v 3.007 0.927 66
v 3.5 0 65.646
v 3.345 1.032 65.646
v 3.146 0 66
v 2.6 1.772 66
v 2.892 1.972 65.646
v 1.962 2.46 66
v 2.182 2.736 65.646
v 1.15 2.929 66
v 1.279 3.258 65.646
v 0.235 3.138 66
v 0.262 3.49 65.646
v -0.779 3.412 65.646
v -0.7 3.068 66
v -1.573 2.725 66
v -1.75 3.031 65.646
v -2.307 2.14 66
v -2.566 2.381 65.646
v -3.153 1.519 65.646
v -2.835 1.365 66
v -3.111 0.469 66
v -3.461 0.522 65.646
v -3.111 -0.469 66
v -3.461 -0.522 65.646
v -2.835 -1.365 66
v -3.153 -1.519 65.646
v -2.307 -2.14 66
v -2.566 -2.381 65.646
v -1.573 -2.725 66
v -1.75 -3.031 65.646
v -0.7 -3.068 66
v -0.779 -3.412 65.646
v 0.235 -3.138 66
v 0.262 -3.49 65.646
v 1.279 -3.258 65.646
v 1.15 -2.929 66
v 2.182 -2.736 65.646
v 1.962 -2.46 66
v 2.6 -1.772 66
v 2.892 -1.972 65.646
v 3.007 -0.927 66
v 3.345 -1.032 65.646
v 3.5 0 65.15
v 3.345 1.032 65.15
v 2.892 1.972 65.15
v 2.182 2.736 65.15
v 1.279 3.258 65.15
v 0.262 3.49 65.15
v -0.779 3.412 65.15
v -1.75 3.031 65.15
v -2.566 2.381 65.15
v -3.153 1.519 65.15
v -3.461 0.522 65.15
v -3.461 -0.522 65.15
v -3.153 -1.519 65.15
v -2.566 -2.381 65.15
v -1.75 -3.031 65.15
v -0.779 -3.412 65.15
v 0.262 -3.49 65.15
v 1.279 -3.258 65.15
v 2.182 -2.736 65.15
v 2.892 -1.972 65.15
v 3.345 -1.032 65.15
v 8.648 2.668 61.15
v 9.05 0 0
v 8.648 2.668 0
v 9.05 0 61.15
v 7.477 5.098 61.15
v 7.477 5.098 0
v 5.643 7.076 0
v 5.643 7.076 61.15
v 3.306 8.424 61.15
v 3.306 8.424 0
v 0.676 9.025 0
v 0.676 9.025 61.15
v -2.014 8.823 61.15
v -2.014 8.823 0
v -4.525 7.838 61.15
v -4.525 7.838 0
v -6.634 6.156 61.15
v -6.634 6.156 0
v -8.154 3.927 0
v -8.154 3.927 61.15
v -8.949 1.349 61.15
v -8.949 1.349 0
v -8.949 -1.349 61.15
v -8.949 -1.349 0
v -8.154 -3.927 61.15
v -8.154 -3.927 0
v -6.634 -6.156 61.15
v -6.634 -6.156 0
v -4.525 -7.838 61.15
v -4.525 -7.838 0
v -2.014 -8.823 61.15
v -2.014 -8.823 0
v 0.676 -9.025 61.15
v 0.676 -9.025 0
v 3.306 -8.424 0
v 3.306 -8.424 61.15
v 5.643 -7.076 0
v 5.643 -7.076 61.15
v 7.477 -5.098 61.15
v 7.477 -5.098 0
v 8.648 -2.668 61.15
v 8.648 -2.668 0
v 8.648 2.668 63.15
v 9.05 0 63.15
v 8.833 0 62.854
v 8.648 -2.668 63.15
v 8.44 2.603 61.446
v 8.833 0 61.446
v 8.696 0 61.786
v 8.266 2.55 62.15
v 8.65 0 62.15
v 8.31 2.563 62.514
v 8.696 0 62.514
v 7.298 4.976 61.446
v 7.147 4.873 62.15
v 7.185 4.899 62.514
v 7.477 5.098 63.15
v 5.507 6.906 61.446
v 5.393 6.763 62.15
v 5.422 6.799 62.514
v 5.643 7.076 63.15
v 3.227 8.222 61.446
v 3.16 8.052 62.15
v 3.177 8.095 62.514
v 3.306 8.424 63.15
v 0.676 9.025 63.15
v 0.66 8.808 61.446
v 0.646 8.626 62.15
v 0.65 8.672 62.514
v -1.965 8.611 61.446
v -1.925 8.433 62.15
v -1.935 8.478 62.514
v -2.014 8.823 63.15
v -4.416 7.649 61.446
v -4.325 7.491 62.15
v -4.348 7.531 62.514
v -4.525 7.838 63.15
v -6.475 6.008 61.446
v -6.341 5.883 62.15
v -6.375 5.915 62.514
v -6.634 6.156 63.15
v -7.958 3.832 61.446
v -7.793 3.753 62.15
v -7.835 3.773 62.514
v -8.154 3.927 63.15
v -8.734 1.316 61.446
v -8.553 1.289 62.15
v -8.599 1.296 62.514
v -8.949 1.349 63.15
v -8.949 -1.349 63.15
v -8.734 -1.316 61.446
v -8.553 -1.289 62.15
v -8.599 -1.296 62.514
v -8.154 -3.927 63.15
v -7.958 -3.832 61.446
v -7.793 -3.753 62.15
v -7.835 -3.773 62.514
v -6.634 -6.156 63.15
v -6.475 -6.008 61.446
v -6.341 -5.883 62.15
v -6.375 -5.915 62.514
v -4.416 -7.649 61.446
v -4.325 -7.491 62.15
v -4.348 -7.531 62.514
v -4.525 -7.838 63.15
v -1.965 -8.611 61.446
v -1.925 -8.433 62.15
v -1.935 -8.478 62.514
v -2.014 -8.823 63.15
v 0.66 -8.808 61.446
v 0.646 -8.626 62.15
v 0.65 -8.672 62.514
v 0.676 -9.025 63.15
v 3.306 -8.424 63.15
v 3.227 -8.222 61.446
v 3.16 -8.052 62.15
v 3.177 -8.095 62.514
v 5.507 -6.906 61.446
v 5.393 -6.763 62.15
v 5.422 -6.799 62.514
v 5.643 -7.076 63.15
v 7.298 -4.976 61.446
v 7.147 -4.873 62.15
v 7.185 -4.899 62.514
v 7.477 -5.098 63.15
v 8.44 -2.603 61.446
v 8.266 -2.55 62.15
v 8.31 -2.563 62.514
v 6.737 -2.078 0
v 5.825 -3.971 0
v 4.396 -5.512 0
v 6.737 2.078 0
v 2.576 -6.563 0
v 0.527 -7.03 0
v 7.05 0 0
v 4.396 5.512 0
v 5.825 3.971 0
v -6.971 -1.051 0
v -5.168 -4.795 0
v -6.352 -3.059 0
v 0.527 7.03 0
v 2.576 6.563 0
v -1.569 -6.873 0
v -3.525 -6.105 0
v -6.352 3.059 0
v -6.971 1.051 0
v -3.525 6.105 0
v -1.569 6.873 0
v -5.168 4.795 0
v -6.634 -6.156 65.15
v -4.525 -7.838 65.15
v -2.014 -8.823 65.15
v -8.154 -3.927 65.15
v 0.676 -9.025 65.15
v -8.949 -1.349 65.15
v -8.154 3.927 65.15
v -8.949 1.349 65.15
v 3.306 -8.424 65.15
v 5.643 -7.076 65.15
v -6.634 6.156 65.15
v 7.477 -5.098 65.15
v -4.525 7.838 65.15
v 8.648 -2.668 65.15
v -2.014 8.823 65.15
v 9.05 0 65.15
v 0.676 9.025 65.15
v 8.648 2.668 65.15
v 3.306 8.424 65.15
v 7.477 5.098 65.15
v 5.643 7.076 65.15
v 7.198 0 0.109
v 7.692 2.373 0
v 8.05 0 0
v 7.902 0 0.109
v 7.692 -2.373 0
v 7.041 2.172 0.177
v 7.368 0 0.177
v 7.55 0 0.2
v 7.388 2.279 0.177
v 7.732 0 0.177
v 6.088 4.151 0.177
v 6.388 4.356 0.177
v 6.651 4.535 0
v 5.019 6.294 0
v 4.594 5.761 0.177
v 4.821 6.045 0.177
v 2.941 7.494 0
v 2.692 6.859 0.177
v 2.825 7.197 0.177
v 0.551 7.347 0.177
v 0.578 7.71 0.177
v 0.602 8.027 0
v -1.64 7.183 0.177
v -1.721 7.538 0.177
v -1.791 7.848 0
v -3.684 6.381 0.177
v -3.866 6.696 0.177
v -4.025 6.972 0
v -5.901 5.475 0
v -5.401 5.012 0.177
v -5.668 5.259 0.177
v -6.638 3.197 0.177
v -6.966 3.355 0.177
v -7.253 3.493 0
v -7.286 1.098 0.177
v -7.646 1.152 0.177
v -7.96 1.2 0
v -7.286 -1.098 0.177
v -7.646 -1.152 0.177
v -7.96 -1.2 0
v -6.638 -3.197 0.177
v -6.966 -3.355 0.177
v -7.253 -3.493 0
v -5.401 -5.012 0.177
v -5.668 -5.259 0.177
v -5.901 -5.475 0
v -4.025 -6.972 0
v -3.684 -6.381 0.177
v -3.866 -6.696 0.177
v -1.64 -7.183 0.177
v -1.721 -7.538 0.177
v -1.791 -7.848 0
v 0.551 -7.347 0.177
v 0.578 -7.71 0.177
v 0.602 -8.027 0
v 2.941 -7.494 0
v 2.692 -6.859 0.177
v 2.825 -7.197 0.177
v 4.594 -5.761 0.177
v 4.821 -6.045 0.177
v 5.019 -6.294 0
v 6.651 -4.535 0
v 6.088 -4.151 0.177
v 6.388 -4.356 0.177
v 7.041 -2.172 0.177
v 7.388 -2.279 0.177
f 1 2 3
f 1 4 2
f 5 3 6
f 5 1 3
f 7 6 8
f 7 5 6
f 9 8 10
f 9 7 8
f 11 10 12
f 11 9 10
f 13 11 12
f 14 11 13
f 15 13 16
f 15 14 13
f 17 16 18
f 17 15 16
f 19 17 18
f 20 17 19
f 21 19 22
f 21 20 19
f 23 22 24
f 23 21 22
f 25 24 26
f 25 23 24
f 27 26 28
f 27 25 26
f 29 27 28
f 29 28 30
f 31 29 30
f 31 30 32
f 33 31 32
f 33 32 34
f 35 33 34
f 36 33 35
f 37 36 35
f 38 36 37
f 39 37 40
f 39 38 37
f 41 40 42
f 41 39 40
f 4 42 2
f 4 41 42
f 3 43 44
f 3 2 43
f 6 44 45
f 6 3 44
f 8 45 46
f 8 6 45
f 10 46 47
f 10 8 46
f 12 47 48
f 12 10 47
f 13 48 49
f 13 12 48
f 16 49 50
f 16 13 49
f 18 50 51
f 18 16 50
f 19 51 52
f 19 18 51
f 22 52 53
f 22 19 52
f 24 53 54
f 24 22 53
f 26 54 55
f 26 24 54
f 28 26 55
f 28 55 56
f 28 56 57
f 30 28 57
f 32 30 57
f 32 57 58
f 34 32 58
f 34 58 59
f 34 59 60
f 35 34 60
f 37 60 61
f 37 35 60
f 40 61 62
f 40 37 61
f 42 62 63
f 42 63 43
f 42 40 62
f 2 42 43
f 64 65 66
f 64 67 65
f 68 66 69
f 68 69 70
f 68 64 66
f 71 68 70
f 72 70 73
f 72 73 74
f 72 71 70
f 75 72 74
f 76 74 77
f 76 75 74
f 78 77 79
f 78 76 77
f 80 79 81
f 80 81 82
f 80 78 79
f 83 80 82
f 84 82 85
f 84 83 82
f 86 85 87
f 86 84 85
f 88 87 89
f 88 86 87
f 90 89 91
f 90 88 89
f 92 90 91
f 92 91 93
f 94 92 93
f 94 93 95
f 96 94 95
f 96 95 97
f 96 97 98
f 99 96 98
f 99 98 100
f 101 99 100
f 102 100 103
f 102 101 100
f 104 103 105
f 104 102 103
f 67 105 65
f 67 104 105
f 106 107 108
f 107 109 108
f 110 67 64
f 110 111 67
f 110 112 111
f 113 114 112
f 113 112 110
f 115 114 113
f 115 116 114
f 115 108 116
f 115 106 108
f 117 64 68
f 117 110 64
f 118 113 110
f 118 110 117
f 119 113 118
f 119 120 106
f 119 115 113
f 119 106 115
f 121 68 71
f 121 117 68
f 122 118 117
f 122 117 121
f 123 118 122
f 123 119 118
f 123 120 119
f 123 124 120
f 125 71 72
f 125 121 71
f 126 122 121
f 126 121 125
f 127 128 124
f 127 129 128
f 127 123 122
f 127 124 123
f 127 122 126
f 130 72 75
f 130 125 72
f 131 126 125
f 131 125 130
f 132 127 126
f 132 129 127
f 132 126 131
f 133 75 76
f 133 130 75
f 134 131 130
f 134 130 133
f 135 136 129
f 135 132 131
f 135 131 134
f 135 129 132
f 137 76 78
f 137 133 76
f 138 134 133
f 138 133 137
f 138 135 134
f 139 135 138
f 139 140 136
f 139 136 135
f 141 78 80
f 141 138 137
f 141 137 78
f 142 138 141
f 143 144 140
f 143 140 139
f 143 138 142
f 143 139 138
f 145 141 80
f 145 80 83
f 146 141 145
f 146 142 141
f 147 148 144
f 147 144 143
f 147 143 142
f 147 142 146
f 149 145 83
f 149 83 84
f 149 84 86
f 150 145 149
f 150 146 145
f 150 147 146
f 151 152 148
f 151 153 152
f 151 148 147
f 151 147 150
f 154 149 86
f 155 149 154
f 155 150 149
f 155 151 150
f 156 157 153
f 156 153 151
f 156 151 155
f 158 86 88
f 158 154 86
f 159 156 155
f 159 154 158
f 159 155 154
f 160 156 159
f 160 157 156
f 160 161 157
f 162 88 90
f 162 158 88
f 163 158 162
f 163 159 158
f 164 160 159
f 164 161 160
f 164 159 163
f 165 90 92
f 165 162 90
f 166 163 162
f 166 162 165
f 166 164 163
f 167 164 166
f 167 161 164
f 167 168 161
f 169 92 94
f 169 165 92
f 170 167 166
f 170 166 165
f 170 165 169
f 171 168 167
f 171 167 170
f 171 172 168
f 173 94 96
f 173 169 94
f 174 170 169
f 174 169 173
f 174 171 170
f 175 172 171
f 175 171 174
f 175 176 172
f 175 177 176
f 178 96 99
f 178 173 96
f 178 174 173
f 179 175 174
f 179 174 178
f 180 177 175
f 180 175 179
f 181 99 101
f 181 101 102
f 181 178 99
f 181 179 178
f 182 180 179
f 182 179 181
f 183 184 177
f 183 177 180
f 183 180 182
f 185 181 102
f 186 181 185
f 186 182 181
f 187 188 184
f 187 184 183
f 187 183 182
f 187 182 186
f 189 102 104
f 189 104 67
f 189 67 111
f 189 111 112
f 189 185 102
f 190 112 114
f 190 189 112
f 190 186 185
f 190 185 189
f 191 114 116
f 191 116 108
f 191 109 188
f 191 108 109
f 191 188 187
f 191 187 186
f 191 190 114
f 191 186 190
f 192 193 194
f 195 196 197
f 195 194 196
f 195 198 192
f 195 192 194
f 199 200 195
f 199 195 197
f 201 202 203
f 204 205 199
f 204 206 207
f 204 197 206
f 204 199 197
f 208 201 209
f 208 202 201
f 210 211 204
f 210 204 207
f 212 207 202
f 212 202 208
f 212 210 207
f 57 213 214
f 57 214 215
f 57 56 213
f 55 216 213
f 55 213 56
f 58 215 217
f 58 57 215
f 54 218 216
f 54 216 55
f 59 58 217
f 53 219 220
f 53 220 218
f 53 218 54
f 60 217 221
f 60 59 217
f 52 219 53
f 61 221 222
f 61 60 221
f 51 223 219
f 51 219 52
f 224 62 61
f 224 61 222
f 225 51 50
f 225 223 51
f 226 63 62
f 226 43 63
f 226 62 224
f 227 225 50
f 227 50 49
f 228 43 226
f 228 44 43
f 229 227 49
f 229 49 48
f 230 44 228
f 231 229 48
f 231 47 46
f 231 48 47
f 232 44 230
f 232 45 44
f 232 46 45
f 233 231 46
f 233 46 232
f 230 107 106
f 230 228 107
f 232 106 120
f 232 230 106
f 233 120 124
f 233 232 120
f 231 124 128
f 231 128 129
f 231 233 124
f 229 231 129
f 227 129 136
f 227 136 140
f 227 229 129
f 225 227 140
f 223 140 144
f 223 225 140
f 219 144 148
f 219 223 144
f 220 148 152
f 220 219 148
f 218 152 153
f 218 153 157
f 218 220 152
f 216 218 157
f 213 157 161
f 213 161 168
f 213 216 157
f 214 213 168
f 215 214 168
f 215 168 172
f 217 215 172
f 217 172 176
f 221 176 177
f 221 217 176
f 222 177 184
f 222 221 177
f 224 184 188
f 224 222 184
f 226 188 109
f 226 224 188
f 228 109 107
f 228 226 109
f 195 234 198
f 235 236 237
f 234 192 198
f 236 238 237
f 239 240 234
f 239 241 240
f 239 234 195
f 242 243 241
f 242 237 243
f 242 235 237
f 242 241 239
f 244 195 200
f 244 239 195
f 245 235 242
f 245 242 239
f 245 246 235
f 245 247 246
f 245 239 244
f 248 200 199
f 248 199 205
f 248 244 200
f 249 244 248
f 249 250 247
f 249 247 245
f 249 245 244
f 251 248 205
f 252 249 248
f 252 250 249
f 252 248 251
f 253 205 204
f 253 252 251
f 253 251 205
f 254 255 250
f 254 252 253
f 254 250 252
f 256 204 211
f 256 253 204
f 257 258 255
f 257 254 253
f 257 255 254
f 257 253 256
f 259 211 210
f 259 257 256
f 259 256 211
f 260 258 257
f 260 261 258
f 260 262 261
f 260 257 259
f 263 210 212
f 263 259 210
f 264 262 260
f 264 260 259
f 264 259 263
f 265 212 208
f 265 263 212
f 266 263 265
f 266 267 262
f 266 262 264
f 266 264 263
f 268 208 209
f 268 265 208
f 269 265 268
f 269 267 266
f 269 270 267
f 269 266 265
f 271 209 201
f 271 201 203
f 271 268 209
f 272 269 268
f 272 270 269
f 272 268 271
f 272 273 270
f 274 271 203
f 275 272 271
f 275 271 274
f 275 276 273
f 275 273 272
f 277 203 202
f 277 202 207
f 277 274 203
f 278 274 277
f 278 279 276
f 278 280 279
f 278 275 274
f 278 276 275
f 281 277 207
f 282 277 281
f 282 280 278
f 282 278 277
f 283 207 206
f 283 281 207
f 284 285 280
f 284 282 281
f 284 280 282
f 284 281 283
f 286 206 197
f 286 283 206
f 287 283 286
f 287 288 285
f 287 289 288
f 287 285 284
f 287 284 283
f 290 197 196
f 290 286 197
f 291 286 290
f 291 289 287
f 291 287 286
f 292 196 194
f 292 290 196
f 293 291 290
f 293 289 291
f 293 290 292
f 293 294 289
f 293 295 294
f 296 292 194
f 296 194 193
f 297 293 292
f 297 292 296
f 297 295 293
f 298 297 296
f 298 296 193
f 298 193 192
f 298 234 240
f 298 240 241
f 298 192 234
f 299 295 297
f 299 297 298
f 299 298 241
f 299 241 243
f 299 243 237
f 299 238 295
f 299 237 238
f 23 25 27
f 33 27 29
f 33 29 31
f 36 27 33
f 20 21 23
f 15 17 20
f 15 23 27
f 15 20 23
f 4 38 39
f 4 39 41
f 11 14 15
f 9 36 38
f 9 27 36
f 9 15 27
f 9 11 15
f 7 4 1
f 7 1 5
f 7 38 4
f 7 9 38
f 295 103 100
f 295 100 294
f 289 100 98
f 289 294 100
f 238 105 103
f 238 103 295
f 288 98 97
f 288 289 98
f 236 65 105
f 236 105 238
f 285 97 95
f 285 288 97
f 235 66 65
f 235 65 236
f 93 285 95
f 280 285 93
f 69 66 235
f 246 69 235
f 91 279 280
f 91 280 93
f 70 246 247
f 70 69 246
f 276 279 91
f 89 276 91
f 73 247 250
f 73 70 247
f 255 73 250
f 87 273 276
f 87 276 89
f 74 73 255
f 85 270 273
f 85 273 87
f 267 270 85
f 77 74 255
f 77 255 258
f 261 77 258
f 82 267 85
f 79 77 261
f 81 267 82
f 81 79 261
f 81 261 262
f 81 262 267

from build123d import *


with BuildPart() as f1:
    # F0 (on Front) → F1 (revolve)
    with BuildSketch(Plane.XZ):
        with BuildLine():
            Line((0, 66), (0, 0))
            Line((0, 0), (7.05, 0))
            ThreePointArc((7.05, 0), (7.55, 0.2), (8.05, 0))
            Line((8.05, 0), (9.05, 0))
            Line((9.05, 0), (9.05, 61.15))
            ThreePointArc((9.05, 61.15), (8.65, 62.15), (9.05, 63.15))
            Line((9.05, 63.15), (9.05, 65.15))
            Line((9.05, 65.15), (3.5, 65.15))
            Line((3.5, 65.15), (3.5, 65.646447))
            Line((3.5, 65.646447), (3.146447, 66))
            Line((3.146447, 66), (0, 66))
        make_face()
    revolve(axis=Axis((0, 0, 33), (0, 0, 1)))


solid = f1.part
